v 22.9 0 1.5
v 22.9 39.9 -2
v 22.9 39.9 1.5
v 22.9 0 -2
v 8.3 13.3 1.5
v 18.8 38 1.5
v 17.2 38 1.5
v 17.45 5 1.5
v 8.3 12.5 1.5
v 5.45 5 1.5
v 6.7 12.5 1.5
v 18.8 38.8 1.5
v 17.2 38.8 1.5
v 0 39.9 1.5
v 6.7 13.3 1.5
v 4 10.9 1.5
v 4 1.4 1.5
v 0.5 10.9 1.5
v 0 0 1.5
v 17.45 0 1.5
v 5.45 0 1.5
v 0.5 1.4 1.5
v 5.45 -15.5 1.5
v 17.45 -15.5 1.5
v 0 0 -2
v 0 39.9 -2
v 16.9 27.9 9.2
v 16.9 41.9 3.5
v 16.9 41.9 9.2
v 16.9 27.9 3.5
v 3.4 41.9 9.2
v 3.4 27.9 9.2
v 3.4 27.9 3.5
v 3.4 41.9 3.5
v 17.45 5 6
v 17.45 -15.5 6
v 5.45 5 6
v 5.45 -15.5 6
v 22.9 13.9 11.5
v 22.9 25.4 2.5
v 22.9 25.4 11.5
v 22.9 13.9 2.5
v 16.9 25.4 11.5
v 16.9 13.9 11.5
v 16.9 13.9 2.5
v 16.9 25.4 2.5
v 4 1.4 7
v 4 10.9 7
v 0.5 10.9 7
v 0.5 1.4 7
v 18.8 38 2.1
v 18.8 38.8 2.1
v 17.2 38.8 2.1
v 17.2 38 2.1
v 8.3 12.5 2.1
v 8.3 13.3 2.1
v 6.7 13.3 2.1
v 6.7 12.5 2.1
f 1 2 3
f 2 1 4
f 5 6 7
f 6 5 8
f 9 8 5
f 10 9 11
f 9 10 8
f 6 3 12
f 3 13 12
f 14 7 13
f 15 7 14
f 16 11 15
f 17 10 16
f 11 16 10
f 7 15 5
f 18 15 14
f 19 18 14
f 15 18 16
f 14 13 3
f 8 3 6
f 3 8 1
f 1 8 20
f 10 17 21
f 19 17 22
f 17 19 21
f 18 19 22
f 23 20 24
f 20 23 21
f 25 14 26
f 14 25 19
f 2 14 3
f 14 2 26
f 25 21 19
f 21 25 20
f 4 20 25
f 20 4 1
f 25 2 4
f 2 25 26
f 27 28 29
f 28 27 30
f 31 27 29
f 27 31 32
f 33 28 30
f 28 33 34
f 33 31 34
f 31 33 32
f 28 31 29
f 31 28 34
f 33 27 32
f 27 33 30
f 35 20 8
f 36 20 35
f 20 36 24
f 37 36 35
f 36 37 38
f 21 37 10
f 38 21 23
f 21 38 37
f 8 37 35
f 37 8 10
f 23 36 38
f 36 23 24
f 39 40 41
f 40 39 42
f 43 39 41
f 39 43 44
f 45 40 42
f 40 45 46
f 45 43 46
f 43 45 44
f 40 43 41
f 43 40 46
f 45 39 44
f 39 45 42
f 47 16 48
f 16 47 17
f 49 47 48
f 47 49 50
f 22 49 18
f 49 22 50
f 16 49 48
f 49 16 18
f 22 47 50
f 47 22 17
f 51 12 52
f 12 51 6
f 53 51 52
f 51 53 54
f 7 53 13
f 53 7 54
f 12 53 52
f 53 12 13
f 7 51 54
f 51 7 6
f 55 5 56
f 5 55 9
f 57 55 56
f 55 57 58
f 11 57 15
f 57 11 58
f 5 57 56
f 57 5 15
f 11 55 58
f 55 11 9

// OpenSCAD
// adum3160_board.scad
// Reference model of the Teyleten ADuM3160 USB isolator board (blue PCB).
// This is the GROUND TRUTH the case will be designed around.
//
// Axes (viewed from the component side, female USB-A end "up" as in the photos):
//   X = across the board, 0 = left edge (DIP switch side), + = right (B0505S side)
//   Y = along the board, 0 = male-A end edge, + toward the female-A end edge
//   Z = up, 0 = PCB bottom face
//
// Values marked (std) are standard USB-A sizes, not measured on this board.
// Values marked (est) are estimated from photos.
//
// Preview:  openscad -o adum3160_board.png --render --viewall --autocenter \
//             --imgsize=950,850 --colorscheme=Tomorrow adum3160_board.scad

$fn = 48;

/* ---------- Measured dimensions ---------- */
pcb_w = 22.9;   // X
pcb_l = 39.9;   // Y
pcb_t = 1.5;    // Z

bottom_clear = 2.0;   // max solder/pin protrusion below the PCB

// B0505S isolated DC-DC module: tallest part, on the right edge
dcdc_w       = 6.0;    // X
dcdc_l       = 11.5;   // Y
dcdc_from_fa = 14.5;   // gap from the female-A PCB edge to the module
dcdc_top     = 10.0;   // top height above the PCB top face
dcdc_standoff = 1.0;   // (est) gap under the body

// Female USB-A receptacle (device side, white BoxTurtle cable plugs in)
fa_w        = 13.5;   // 22.9 - 3.4 left gap - 6.0 right gap
fa_h        = 5.7;    // (std)
fa_len      = 14.0;   // (std) body length along Y
fa_z        = 2.0;    // shell bottom above PCB top face
fa_overhang = 2.0;    // mouth past the PCB edge
fa_x        = 3.4 + fa_w/2;   // 3.4 mm gap on the left, 6.0 on the right

// Male USB-A plug (host side, black cable's female socket slides on)
ma_w        = 12.0;   // (std)
ma_h        = 4.5;    // (std)
ma_protrude = 15.5;   // metal past the PCB edge
ma_inboard  = 5.0;    // (est) body on the PCB
ma_x        = pcb_w/2;   // (est) centred

// Small parts (est, from the top photo)
dip_x = 0.5;  dip_y = 1.4;  dip_w = 3.5;  dip_l = 9.5;  dip_h = 5.5;
led_red  = [18.0, pcb_l - 1.5];   // power LED, female-A end
led_blue = [ 7.5, 12.9];          // status LED, middle
led_sz = [1.6, 0.8, 0.6];

/* ---------- Derived (used by the case) ---------- */
pcb_top    = pcb_t;
fa_y0      = pcb_l - fa_len + fa_overhang;
fa_mouth_y = pcb_l + fa_overhang;
ma_tip_y   = -ma_protrude;
fa_axis_z  = pcb_top + fa_z + fa_h/2;
ma_axis_z  = pcb_top + ma_h/2;
dcdc_y0    = pcb_l - dcdc_from_fa - dcdc_l;
board_top  = pcb_top + dcdc_top;   // highest point

/* ---------- Model ---------- */
module pcb()        color("RoyalBlue") cube([pcb_w, pcb_l, pcb_t]);
module solder_zone() color("Silver", 0.35) translate([0, 0, -bottom_clear]) cube([pcb_w, pcb_l, bottom_clear]);

module female_a()
    color("LightGray")
    translate([fa_x - fa_w/2, fa_y0, pcb_top + fa_z]) cube([fa_w, fa_len, fa_h]);

module male_a()
    color("LightGray")
    translate([ma_x - ma_w/2, -ma_protrude, pcb_top]) cube([ma_w, ma_protrude + ma_inboard, ma_h]);

module dcdc()
    color("DimGray")
    translate([pcb_w - dcdc_w, dcdc_y0, pcb_top + dcdc_standoff])
        cube([dcdc_w, dcdc_l, dcdc_top - dcdc_standoff]);

module dip()
    color("Red") translate([dip_x, dip_y, pcb_top]) cube([dip_w, dip_l, dip_h]);

module led(p, c)
    color(c) translate([p[0] - led_sz[0]/2, p[1] - led_sz[1]/2, pcb_top]) cube(led_sz);

module adum3160_board(show_keepout = true) {
    pcb();
    if (show_keepout) solder_zone();
    female_a();
    male_a();
    dcdc();
    dip();
    led(led_red, "OrangeRed");
    led(led_blue, "DeepSkyBlue");
}

board_standalone = true;   // a file that includes this one sets it false
if (board_standalone) adum3160_board();
